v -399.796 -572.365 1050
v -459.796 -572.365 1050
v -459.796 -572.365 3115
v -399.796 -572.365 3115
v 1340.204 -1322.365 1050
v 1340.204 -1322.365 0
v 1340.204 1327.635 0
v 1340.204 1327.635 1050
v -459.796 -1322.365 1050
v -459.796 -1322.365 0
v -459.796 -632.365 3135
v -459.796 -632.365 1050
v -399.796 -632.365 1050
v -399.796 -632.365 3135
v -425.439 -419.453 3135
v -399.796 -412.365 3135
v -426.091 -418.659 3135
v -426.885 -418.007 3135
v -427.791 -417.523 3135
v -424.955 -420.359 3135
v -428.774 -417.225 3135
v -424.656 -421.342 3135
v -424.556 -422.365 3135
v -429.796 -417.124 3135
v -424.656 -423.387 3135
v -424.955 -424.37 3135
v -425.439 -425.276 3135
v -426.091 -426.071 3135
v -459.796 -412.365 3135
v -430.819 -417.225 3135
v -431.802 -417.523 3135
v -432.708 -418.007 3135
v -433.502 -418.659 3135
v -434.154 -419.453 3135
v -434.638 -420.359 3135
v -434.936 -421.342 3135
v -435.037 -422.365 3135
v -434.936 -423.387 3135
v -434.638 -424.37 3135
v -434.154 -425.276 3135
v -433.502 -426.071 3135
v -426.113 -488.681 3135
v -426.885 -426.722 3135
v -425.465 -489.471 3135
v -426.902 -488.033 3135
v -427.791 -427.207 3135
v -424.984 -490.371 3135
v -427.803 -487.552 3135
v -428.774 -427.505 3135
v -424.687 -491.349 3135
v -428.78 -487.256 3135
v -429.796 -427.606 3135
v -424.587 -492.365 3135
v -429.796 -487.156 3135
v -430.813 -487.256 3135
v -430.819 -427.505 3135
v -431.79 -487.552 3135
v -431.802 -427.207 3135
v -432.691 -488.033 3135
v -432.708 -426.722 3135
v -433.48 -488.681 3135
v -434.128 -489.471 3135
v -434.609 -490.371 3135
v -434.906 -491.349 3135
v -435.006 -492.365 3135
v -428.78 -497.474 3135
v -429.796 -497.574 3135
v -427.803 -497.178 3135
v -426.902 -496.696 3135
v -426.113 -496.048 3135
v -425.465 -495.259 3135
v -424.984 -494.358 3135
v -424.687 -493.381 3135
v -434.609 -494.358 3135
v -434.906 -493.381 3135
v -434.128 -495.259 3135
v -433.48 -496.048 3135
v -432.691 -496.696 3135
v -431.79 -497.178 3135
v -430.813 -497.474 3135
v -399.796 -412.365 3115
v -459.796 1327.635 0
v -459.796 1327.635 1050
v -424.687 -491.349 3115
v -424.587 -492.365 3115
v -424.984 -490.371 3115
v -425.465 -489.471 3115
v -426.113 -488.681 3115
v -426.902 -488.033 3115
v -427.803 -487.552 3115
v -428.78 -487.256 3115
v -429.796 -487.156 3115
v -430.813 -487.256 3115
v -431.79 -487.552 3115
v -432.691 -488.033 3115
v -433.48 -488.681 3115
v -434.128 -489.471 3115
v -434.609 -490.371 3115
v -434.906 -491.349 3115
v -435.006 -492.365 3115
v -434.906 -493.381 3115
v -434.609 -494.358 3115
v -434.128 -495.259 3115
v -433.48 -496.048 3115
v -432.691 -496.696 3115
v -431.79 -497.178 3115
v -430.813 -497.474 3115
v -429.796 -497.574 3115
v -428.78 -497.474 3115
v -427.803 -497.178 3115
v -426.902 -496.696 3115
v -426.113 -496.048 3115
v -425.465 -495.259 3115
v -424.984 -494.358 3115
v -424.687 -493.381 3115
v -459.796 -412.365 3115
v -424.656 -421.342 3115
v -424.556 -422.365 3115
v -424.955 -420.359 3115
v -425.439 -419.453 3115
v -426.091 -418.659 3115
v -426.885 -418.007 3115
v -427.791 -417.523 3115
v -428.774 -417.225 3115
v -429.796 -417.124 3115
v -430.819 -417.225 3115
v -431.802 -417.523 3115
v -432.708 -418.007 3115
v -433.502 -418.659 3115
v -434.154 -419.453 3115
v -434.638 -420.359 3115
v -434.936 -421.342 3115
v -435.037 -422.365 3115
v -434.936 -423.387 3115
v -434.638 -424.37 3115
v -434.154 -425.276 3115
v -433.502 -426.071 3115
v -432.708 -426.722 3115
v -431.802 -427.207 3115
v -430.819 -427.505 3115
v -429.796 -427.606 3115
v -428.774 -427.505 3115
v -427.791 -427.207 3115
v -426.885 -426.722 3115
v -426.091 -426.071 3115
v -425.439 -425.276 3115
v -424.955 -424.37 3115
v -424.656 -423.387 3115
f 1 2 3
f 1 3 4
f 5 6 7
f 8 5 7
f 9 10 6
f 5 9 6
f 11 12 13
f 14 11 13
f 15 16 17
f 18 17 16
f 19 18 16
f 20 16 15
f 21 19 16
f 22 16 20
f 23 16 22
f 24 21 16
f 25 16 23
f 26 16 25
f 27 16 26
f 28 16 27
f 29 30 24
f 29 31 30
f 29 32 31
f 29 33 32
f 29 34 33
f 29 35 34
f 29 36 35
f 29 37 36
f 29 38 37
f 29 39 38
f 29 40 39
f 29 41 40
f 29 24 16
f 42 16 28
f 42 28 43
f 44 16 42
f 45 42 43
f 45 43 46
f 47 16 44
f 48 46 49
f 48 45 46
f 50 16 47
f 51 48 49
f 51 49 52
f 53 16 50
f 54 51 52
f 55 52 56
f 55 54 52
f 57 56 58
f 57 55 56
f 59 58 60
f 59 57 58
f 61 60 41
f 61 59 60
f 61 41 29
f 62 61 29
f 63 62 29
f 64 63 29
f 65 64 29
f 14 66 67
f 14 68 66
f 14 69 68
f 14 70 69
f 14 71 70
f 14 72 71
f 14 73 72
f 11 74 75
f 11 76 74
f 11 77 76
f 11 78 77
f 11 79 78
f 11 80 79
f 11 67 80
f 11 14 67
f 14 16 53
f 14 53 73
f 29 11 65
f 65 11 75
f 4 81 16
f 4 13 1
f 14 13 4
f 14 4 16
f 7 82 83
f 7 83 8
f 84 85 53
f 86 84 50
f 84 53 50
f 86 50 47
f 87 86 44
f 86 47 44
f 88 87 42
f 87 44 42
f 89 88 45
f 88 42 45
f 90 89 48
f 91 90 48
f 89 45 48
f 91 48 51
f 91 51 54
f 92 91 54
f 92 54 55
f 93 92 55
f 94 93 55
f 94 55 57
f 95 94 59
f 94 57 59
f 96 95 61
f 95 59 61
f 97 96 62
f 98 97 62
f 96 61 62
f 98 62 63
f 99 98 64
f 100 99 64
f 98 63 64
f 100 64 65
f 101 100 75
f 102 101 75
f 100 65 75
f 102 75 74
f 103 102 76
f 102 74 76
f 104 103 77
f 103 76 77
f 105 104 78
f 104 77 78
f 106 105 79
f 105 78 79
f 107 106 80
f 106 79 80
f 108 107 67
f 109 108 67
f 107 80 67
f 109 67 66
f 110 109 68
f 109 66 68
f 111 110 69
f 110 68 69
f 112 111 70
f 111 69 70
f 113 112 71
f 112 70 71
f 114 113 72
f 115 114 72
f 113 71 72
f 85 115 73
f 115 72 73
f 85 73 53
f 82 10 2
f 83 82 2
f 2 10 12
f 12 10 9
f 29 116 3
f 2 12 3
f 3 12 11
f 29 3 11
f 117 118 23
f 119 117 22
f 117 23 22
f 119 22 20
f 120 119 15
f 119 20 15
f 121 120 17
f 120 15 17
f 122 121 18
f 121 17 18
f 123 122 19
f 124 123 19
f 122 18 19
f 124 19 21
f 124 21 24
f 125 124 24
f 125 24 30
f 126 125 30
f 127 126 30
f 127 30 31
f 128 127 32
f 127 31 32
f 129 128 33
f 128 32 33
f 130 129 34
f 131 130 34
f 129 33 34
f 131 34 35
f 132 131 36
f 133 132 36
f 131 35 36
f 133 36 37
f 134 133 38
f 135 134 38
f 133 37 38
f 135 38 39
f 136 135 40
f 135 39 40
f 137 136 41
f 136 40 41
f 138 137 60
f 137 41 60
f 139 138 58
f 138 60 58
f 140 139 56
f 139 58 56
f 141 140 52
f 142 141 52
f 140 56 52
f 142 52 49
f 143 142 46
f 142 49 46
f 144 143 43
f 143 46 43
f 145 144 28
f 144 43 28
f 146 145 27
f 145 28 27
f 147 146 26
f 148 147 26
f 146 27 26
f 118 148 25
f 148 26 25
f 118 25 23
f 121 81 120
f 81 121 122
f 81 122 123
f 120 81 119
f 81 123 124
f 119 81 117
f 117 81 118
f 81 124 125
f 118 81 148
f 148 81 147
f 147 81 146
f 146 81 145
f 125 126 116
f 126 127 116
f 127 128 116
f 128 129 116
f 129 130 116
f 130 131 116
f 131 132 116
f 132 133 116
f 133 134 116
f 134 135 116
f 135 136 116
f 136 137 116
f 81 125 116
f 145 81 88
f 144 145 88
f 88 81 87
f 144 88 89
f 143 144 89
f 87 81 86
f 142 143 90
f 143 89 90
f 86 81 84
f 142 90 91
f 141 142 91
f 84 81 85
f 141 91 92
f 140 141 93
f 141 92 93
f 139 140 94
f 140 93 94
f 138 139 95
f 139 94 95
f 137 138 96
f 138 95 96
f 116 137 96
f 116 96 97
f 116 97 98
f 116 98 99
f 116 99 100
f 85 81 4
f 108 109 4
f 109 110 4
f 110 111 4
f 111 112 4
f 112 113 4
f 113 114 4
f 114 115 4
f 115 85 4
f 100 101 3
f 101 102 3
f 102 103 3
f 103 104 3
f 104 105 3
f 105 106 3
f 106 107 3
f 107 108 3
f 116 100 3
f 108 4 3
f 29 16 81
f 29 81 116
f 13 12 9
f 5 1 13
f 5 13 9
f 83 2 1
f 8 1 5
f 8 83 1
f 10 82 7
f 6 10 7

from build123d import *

# Parameters (mm, degrees)
F0_W     = 1800
F0_H     = 2650
F1_DEPTH = 1050
F2_W     = 60
F2_H     = 60
F3_DEPTH = 2085
F4_W     = 60
F4_H     = 20
F5_DEPTH = 160
F6_R     = 5.209347
F6_R_2   = 5.240667
F7_DEPTH = 20


with BuildPart() as f1:
    # F0 (on Top) → F1 (new body)
    with BuildSketch(Plane.XY):
        with Locations((440.203567, 2.635106)):
            Rectangle(F0_W, F0_H)
    extrude(amount=F1_DEPTH)

    # F2 (on face) → F3 (join)
    with BuildSketch(Plane.XY.offset(1050)):
        with Locations((-429.796433, -602.364894)):
            Rectangle(F2_W, F2_H)
    extrude(amount=F3_DEPTH)

    # F4 (on face) → F5 (join)
    with BuildSketch(Plane(origin=(0, -572.364894, 0), x_dir=(-1, 0, 0), z_dir=(0, 1, 0))):
        with Locations((429.796433, 3125)):
            Rectangle(F4_W, F4_H)
    extrude(amount=F5_DEPTH)

    # F6 (on face) → F7 (cut, through all)
    with BuildSketch(Plane.XY.offset(3135)):
        with Locations((-429.796433, -492.364894)):
            Circle(F6_R)
        with Locations((-429.796433, -422.364894)):
            Circle(F6_R_2)
    extrude(amount=-F7_DEPTH, mode=Mode.SUBTRACT)


solid = f1.part
